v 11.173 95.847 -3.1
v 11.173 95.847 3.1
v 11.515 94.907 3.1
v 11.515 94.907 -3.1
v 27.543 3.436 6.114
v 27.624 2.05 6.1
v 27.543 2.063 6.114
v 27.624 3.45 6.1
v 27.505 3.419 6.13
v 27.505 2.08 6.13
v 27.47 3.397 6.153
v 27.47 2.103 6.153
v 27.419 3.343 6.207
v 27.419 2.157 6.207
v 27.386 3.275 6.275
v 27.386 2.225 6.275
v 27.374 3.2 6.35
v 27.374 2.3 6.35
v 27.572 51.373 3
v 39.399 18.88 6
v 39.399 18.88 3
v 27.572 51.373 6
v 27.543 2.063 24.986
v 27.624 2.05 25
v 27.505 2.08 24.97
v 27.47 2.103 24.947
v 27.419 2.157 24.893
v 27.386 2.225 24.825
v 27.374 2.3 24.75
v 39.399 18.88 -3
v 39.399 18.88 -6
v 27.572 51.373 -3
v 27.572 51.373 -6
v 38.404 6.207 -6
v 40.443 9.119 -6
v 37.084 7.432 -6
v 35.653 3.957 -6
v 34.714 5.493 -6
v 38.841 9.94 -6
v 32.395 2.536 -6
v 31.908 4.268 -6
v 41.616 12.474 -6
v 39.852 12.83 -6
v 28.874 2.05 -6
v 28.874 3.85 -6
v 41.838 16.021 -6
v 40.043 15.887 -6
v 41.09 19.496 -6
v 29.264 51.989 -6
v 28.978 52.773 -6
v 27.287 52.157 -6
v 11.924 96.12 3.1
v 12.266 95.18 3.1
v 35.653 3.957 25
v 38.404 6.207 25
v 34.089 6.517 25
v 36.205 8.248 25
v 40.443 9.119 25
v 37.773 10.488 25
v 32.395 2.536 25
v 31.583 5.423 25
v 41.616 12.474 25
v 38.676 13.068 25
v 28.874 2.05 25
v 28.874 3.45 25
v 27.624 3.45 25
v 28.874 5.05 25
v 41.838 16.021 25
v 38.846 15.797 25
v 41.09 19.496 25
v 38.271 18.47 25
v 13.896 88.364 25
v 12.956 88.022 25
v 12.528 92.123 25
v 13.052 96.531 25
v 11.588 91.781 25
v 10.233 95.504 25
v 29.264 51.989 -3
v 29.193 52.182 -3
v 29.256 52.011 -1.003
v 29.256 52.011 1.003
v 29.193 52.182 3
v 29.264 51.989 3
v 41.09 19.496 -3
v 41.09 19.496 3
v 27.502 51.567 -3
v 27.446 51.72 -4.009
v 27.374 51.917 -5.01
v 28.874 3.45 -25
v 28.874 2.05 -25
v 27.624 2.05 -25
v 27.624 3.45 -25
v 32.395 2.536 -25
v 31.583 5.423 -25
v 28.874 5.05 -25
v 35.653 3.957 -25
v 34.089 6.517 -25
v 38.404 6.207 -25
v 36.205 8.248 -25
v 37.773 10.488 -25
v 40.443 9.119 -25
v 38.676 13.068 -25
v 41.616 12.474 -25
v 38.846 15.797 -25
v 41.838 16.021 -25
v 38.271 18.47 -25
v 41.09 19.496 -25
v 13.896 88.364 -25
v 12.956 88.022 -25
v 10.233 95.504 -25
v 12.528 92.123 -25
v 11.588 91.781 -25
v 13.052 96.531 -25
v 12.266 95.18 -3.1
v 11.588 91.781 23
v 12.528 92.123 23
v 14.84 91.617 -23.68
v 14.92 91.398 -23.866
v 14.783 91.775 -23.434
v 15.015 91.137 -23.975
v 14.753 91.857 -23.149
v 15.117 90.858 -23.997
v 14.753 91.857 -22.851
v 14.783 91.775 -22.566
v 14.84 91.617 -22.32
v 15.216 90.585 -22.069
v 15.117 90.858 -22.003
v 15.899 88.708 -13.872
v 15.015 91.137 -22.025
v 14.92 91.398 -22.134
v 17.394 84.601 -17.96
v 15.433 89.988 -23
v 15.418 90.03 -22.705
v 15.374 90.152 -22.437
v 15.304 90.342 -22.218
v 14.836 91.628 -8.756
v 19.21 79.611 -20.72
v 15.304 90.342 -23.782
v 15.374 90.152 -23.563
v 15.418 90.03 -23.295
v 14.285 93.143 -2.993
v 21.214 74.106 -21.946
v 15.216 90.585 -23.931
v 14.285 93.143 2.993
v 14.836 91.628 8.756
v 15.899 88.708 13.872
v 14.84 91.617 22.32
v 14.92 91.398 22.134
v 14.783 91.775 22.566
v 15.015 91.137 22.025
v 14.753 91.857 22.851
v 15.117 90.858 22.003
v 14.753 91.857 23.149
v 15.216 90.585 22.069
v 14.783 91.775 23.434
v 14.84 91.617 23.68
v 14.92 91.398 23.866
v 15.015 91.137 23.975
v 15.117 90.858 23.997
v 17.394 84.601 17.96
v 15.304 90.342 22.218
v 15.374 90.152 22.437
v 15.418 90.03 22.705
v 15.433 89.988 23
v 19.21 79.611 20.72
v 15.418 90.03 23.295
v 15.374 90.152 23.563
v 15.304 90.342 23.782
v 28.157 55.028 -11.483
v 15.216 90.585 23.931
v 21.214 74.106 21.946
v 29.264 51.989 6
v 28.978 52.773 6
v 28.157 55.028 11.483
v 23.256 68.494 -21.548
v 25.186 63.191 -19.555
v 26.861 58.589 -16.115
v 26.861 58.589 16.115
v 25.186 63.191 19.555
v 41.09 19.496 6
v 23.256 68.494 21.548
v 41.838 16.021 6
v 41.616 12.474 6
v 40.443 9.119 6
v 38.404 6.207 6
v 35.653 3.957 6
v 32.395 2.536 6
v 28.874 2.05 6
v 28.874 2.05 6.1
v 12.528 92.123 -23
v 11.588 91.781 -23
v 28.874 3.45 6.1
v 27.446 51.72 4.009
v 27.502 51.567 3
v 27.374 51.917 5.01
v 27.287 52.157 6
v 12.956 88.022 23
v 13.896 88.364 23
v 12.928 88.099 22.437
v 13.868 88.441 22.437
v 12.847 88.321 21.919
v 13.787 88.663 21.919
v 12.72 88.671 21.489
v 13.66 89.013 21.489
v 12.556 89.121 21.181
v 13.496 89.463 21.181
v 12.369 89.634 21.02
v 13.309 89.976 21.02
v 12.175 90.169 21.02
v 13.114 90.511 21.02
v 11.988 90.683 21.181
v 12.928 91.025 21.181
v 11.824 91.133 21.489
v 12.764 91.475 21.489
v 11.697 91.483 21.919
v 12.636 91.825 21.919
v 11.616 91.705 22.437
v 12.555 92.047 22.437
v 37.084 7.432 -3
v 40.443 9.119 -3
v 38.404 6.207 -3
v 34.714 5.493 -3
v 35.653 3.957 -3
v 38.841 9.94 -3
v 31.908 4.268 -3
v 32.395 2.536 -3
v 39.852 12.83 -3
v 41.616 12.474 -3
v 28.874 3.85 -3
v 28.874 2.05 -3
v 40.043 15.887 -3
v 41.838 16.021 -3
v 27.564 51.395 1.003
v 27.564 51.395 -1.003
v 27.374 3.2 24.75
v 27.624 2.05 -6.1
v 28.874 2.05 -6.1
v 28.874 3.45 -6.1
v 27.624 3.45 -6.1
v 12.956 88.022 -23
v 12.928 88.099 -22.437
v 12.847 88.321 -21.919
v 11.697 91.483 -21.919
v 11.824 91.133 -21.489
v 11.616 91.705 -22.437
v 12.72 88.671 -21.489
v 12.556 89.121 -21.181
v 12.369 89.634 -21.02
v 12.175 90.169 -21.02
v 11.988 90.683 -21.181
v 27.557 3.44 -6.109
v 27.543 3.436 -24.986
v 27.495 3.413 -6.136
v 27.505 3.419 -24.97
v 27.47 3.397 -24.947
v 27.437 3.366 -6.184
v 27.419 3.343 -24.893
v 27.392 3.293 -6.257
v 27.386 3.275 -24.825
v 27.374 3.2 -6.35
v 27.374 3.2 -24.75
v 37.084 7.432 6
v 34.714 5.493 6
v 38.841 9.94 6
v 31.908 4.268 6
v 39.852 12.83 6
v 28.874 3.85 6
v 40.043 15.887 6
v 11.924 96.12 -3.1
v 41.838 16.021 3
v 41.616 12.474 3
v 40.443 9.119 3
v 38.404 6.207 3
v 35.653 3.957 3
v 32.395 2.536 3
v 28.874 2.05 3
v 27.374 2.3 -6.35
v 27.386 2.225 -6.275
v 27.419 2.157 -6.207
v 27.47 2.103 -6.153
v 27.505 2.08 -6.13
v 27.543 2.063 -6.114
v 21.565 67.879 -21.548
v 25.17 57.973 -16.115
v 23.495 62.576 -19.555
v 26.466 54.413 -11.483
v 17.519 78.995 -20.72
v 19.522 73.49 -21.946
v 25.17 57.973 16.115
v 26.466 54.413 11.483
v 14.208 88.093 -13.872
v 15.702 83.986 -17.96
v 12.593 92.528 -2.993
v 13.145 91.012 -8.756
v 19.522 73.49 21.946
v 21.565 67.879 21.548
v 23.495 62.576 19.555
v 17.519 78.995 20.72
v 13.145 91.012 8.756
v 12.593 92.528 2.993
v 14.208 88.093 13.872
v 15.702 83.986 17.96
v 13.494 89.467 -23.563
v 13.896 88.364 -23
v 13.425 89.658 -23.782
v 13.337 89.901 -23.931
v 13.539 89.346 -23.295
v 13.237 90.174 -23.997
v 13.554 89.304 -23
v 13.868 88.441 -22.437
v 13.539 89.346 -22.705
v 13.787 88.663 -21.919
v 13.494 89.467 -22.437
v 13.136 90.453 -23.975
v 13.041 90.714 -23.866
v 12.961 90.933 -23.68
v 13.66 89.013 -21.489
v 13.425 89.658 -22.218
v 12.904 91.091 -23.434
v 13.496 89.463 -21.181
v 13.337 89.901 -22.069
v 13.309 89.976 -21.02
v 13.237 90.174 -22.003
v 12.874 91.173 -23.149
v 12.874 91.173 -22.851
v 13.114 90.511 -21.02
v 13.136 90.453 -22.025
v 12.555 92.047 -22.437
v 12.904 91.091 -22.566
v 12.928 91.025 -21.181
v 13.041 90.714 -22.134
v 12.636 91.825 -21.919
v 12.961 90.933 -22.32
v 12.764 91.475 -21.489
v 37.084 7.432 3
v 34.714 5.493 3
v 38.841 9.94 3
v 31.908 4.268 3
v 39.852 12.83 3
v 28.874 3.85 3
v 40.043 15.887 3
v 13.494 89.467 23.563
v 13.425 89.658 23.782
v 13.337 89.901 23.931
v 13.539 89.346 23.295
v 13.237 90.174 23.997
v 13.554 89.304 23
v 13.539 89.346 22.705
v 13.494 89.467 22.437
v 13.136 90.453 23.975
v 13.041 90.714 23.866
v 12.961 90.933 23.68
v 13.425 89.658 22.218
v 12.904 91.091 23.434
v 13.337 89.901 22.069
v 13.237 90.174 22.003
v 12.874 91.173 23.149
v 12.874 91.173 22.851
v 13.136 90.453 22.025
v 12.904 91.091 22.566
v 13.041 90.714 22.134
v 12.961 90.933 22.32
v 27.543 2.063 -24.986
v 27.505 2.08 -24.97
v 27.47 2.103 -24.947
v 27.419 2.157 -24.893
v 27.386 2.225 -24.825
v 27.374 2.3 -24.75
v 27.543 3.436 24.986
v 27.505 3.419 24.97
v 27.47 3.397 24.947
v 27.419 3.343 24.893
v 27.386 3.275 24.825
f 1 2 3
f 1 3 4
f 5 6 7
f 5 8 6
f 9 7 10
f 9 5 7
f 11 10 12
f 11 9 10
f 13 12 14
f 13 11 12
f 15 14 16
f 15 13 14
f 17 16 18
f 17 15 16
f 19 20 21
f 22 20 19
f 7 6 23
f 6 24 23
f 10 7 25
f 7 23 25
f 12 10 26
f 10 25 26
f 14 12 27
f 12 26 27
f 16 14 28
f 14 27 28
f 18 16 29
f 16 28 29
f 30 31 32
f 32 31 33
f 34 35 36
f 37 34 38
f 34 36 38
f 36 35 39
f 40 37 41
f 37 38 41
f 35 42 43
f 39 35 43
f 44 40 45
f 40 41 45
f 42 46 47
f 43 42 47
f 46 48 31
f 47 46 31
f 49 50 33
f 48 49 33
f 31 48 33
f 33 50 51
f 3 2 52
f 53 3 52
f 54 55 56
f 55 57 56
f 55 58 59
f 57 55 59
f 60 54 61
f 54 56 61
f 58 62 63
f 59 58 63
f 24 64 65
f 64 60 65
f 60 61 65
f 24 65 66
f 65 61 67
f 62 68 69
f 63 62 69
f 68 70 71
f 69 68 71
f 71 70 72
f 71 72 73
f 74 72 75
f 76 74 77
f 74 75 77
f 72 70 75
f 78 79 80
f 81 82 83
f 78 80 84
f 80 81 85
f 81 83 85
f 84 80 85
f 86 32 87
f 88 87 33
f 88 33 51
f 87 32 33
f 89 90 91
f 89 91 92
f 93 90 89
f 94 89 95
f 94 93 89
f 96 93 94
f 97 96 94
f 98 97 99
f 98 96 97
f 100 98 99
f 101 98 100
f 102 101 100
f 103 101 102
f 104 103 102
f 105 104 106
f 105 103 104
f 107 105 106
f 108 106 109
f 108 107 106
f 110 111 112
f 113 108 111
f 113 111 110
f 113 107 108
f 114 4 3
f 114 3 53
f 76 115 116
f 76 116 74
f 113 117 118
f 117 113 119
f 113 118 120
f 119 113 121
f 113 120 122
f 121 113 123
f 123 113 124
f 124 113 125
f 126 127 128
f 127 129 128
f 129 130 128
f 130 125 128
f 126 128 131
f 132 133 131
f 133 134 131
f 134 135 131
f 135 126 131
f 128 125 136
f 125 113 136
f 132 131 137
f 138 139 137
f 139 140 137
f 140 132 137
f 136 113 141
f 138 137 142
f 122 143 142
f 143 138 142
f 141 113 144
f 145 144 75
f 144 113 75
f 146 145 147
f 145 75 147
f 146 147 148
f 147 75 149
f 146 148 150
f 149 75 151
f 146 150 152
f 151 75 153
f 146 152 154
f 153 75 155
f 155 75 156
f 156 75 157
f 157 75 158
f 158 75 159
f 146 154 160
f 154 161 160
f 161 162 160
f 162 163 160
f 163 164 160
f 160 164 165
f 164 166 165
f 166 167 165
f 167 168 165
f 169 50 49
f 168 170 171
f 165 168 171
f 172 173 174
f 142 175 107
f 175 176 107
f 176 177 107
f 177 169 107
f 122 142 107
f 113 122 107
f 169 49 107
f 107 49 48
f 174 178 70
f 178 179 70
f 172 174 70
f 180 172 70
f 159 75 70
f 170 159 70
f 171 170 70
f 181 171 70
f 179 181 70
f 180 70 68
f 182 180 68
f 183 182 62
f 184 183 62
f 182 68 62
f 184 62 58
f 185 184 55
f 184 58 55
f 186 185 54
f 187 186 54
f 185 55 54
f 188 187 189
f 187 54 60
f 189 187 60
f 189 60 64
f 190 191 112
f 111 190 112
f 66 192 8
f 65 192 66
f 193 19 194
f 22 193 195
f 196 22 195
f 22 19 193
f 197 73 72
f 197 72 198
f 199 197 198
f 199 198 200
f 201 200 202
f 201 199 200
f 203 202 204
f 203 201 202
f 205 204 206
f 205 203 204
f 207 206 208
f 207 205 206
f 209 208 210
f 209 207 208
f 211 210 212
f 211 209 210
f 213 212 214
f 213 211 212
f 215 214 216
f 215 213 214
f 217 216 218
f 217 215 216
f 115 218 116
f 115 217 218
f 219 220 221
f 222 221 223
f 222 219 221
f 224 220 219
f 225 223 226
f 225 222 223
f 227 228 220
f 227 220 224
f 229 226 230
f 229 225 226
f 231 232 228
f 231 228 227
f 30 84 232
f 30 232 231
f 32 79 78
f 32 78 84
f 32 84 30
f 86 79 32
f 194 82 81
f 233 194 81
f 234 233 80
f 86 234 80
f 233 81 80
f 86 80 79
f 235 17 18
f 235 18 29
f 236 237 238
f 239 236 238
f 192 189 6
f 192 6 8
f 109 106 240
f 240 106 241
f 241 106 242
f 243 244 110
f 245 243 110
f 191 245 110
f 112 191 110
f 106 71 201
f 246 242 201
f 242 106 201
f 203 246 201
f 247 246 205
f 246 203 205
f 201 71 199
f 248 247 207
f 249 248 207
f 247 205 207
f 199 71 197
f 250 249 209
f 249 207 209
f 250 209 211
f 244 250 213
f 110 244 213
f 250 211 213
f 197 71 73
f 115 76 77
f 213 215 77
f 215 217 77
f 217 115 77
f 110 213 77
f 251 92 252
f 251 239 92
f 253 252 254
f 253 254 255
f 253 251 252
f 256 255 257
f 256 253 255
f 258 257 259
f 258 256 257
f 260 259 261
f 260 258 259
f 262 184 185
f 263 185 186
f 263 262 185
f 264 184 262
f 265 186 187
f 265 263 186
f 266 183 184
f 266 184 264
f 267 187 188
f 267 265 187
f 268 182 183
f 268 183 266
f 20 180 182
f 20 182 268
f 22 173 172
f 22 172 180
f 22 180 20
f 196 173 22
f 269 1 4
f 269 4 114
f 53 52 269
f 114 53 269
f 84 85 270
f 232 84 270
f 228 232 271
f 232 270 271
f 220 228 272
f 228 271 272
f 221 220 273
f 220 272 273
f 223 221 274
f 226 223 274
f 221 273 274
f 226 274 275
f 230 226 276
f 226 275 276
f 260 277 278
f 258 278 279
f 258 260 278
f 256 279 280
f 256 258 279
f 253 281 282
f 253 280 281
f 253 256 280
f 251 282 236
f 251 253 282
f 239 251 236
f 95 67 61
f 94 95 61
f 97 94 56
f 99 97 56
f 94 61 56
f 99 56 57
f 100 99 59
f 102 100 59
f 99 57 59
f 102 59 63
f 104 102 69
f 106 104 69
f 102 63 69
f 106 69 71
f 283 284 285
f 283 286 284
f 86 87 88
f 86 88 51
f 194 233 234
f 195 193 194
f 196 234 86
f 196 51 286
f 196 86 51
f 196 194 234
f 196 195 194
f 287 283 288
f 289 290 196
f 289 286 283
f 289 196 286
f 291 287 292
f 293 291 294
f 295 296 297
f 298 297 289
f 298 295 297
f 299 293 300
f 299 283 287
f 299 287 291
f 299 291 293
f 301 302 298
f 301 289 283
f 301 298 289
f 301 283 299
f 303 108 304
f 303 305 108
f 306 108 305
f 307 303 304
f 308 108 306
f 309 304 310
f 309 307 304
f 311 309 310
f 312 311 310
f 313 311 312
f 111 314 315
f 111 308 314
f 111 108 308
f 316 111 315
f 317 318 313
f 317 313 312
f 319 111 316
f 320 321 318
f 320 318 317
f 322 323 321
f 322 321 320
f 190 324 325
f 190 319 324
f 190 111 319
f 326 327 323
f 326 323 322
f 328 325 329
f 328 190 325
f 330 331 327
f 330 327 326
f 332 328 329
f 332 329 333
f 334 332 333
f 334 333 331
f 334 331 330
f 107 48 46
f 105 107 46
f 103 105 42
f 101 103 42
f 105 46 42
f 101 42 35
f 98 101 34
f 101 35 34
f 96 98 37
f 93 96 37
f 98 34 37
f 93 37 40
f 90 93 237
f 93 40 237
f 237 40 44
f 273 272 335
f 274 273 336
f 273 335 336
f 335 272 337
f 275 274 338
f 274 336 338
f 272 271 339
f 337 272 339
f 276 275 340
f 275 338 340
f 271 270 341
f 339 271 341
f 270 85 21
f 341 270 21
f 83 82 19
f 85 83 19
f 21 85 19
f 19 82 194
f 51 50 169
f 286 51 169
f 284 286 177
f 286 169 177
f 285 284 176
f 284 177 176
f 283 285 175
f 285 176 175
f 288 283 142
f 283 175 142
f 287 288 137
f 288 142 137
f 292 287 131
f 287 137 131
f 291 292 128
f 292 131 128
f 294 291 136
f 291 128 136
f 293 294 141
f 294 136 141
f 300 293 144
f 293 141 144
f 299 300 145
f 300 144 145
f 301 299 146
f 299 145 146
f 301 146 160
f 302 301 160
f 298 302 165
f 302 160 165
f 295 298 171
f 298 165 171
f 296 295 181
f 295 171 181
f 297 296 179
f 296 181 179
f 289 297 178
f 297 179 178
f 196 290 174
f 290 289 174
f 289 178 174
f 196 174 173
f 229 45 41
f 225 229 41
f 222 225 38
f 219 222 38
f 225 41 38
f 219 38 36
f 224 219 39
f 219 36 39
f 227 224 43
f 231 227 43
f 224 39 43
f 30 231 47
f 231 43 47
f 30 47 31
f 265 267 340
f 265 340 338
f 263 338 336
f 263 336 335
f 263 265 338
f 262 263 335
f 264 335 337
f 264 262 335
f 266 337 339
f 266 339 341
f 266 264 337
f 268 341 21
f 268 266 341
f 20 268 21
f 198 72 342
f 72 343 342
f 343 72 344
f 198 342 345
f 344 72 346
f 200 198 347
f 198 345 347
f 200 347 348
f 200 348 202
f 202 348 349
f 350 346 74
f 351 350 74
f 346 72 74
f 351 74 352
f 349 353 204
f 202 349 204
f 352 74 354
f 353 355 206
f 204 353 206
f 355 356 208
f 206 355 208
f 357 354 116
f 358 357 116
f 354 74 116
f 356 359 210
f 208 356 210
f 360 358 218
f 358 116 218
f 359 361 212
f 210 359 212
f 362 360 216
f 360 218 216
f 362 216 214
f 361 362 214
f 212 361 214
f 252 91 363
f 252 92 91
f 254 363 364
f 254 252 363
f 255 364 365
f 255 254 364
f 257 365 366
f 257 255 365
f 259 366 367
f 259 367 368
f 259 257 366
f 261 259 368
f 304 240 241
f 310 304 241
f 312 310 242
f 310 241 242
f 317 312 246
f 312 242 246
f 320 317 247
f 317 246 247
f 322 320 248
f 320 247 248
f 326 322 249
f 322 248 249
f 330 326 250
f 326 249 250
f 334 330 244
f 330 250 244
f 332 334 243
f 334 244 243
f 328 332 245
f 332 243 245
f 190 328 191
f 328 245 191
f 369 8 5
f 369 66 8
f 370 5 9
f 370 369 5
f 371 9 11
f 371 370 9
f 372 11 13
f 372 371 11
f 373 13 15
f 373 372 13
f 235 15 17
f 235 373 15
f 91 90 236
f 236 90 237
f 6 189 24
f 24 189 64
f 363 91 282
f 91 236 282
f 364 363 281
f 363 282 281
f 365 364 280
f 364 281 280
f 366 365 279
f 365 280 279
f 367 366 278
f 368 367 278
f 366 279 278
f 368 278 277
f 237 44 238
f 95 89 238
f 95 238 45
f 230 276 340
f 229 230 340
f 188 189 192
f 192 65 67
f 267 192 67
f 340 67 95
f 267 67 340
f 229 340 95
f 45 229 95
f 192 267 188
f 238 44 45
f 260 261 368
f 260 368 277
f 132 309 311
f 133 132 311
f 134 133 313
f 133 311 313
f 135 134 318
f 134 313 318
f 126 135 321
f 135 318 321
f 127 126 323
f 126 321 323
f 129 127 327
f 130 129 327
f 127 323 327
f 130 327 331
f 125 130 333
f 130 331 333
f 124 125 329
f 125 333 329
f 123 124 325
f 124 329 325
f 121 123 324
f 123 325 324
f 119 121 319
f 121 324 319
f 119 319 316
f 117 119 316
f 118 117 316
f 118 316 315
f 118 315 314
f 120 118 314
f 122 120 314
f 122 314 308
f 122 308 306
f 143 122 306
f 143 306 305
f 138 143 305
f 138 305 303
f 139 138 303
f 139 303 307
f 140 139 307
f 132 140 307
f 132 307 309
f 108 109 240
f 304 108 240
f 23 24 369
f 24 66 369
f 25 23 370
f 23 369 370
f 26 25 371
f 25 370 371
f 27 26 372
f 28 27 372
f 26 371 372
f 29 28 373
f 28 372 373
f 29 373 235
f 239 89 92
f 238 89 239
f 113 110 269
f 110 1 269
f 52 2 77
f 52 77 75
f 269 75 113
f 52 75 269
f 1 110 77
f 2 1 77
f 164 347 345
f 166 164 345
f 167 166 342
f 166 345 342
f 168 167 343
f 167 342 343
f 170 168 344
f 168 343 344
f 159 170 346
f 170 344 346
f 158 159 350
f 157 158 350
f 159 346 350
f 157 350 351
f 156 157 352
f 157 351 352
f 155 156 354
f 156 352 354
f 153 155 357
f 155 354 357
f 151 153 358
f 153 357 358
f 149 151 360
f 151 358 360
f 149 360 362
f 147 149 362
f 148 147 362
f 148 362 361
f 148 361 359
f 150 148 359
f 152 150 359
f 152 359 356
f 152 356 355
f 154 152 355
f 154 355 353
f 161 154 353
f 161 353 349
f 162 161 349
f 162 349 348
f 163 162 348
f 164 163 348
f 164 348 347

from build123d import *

# Parameters (mm, degrees)
EXTRUDE_1_DEPTH        = 25
SKETCH_4_R             = 22
CUT_EXTRUDE_1_DEPTH    = 1.8
CUT_EXTRUDE_START      = 6
CUT_EXTRUDE_1_2_DEPTH  = 3
SKETCH_11_W            = 18.9
SKETCH_11_H            = 1.4
EXTRUDE_3_DEPTH        = 1.5
FILLET_1_R             = 0.25
SKETCH_12_R            = 1
CUT_EXTRUDE_2623_DEPTH = 91.722501261
CUT_EXTRUDE_1_3_DEPTH  = 1
SKETCH_14_W            = 0.8
SKETCH_14_H            = 6.2
CUT_EXTRUDE_2_DEPTH    = 1


with BuildPart() as part:
    # 草图2 → 整体拉伸-薄壁1 (new, symmetric)
    with BuildSketch(Plane.XY):
        with BuildLine():
            ThreePointArc((28.874192719, 5.049687275), (37.065713162, 9.313922912), (38.271118927, 18.469888708))
            Line((38.271118927, 18.469888708), (10.23281379, 95.504498952))
            Line((10.23281379, 95.504498952), (13.051891653, 96.530559382))
            Line((13.051891653, 96.530559382), (41.090196789, 19.495949138))
            ThreePointArc((41.090196789, 19.495949138), (39.523169295, 7.593193603), (28.874192719, 2.049687275))
            Line((28.874192719, 2.049687275), (28.874192719, 5.049687275))
        make_face()
    extrude(amount=EXTRUDE_1_DEPTH, both=True)

    # 草图4 → Cut-Extrude 1 (cut)
    with BuildSketch(Plane(origin=(42.549434126, 15.486727507, 0), x_dir=(0, 0, -1), z_dir=(0.9396926207859071, 0.3420201433256726, 0))):
        with Locations(Location((0, 60.845044478, 0), (0, 0, 90))):
            Circle(SKETCH_4_R)
    extrude(amount=-CUT_EXTRUDE_1_DEPTH, mode=Mode.SUBTRACT)

    # 草图3 → Cut-Extrude 1 2 (cut)
    with BuildSketch(Plane.XY.offset(CUT_EXTRUDE_START)):
        with BuildLine():
            ThreePointArc((28.874192719, 3.849687275), (38.048695615, 8.625631188), (39.398750072, 18.88031288))
            Line((39.398750072, 18.88031288), (27.572199729, 51.373492899))
            Line((27.572199729, 51.373492899), (26.546139299, 54.192570761))
            Line((26.546139299, 54.192570761), (28.237586016, 54.808207019))
            Line((28.237586016, 54.808207019), (29.263646446, 51.989129157))
            Line((29.263646446, 51.989129157), (41.090196789, 19.495949138))
            ThreePointArc((41.090196789, 19.495949138), (39.523169295, 7.593193603), (28.874192719, 2.049687275))
            Line((28.874192719, 2.049687275), (28.874192719, 3.849687275))
        make_face()
    cut_extrude_1_2 = extrude(amount=-CUT_EXTRUDE_1_2_DEPTH, mode=Mode.SUBTRACT)

    # 镜向1: Cut-Extrude 1 2 across plane
    add(cut_extrude_1_2.mirror(Plane.XY), mode=Mode.SUBTRACT)

    # 草图11 → 底部卡扣凸台-拉伸3 (add)
    with BuildSketch(Plane.ZY.offset(-28.874192719)):
        with Locations((-15.55, 2.749687275)):
            Rectangle(SKETCH_11_W, SKETCH_11_H)
        with Locations((15.55, 2.749687275)):
            Rectangle(SKETCH_11_W, SKETCH_11_H)
    extrude(amount=EXTRUDE_3_DEPTH)

    # 底部卡扣圆角1
    fillet_1_edges = [part.edges().sort_by_distance(p)[0] for p in [
        (27.374192719, 2.749687275, -25),
        (27.374192719, 2.049687275, -15.55),
        (27.374192719, 2.749687275, -6.1),
        (27.374192719, 3.449687275, -15.55),
        (27.374192719, 2.749687275, 6.1),
        (27.374192719, 2.049687275, 15.55),
        (27.374192719, 2.749687275, 25),
        (27.374192719, 3.449687275, 15.55),
    ]]
    fillet(fillet_1_edges, radius=FILLET_1_R)

    # 草图12 → Cut-Extrude 2623 (cut, through all)
    with BuildSketch(Plane(origin=(39.730356264, 14.460667077, 0), x_dir=(0, 0, 1), z_dir=(-0.9396926207859071, -0.3420201433256726, 0))):
        with Locations(Location((23, 80.282840932, 0), (0, 0, 270))):
            Circle(SKETCH_12_R)
        with Locations(Location((-23, 80.282840932, 0), (0, 0, 270))):
            Circle(SKETCH_12_R)
    extrude(amount=-CUT_EXTRUDE_2623_DEPTH, mode=Mode.SUBTRACT)

    # 草图13 → Cut-Extrude 1 3 (cut)
    with BuildSketch(Plane(origin=(39.730356264, 14.460667077, 0), x_dir=(0, 0, 1), z_dir=(-0.9396926207859071, -0.3420201433256726, 0))):
        with BuildLine():
            Line((23, 82.282840932), (25, 82.282840932))
            Line((25, 82.282840932), (25, 78.282840932))
            Line((25, 78.282840932), (23, 78.282840932))
            ThreePointArc((23, 78.282840932), (21, 80.282840932), (23, 82.282840932))
        make_face()
        with BuildLine():
            Line((-25, 82.282840932), (-25, 78.282840932))
            Line((-25, 78.282840932), (-23, 78.282840932))
            ThreePointArc((-23, 78.282840932), (-21, 80.282840932), (-23, 82.282840932))
            Line((-23, 82.282840932), (-25, 82.282840932))
        make_face()
    extrude(amount=-CUT_EXTRUDE_1_3_DEPTH, mode=Mode.SUBTRACT)

    # 草图14 → 切除-拉伸2 (cut)
    with BuildSketch(Plane(origin=(-29.497542473, 81.043831875, 0), x_dir=(0.9396926207859067, 0.3420201433256736, 0), z_dir=(-0.3420201433256736, 0.9396926207859068, 0))):
        with Locations((43.680162028, 0)):
            Rectangle(SKETCH_14_W, SKETCH_14_H)
    extrude(amount=-CUT_EXTRUDE_2_DEPTH, mode=Mode.SUBTRACT)


solid = part.part
